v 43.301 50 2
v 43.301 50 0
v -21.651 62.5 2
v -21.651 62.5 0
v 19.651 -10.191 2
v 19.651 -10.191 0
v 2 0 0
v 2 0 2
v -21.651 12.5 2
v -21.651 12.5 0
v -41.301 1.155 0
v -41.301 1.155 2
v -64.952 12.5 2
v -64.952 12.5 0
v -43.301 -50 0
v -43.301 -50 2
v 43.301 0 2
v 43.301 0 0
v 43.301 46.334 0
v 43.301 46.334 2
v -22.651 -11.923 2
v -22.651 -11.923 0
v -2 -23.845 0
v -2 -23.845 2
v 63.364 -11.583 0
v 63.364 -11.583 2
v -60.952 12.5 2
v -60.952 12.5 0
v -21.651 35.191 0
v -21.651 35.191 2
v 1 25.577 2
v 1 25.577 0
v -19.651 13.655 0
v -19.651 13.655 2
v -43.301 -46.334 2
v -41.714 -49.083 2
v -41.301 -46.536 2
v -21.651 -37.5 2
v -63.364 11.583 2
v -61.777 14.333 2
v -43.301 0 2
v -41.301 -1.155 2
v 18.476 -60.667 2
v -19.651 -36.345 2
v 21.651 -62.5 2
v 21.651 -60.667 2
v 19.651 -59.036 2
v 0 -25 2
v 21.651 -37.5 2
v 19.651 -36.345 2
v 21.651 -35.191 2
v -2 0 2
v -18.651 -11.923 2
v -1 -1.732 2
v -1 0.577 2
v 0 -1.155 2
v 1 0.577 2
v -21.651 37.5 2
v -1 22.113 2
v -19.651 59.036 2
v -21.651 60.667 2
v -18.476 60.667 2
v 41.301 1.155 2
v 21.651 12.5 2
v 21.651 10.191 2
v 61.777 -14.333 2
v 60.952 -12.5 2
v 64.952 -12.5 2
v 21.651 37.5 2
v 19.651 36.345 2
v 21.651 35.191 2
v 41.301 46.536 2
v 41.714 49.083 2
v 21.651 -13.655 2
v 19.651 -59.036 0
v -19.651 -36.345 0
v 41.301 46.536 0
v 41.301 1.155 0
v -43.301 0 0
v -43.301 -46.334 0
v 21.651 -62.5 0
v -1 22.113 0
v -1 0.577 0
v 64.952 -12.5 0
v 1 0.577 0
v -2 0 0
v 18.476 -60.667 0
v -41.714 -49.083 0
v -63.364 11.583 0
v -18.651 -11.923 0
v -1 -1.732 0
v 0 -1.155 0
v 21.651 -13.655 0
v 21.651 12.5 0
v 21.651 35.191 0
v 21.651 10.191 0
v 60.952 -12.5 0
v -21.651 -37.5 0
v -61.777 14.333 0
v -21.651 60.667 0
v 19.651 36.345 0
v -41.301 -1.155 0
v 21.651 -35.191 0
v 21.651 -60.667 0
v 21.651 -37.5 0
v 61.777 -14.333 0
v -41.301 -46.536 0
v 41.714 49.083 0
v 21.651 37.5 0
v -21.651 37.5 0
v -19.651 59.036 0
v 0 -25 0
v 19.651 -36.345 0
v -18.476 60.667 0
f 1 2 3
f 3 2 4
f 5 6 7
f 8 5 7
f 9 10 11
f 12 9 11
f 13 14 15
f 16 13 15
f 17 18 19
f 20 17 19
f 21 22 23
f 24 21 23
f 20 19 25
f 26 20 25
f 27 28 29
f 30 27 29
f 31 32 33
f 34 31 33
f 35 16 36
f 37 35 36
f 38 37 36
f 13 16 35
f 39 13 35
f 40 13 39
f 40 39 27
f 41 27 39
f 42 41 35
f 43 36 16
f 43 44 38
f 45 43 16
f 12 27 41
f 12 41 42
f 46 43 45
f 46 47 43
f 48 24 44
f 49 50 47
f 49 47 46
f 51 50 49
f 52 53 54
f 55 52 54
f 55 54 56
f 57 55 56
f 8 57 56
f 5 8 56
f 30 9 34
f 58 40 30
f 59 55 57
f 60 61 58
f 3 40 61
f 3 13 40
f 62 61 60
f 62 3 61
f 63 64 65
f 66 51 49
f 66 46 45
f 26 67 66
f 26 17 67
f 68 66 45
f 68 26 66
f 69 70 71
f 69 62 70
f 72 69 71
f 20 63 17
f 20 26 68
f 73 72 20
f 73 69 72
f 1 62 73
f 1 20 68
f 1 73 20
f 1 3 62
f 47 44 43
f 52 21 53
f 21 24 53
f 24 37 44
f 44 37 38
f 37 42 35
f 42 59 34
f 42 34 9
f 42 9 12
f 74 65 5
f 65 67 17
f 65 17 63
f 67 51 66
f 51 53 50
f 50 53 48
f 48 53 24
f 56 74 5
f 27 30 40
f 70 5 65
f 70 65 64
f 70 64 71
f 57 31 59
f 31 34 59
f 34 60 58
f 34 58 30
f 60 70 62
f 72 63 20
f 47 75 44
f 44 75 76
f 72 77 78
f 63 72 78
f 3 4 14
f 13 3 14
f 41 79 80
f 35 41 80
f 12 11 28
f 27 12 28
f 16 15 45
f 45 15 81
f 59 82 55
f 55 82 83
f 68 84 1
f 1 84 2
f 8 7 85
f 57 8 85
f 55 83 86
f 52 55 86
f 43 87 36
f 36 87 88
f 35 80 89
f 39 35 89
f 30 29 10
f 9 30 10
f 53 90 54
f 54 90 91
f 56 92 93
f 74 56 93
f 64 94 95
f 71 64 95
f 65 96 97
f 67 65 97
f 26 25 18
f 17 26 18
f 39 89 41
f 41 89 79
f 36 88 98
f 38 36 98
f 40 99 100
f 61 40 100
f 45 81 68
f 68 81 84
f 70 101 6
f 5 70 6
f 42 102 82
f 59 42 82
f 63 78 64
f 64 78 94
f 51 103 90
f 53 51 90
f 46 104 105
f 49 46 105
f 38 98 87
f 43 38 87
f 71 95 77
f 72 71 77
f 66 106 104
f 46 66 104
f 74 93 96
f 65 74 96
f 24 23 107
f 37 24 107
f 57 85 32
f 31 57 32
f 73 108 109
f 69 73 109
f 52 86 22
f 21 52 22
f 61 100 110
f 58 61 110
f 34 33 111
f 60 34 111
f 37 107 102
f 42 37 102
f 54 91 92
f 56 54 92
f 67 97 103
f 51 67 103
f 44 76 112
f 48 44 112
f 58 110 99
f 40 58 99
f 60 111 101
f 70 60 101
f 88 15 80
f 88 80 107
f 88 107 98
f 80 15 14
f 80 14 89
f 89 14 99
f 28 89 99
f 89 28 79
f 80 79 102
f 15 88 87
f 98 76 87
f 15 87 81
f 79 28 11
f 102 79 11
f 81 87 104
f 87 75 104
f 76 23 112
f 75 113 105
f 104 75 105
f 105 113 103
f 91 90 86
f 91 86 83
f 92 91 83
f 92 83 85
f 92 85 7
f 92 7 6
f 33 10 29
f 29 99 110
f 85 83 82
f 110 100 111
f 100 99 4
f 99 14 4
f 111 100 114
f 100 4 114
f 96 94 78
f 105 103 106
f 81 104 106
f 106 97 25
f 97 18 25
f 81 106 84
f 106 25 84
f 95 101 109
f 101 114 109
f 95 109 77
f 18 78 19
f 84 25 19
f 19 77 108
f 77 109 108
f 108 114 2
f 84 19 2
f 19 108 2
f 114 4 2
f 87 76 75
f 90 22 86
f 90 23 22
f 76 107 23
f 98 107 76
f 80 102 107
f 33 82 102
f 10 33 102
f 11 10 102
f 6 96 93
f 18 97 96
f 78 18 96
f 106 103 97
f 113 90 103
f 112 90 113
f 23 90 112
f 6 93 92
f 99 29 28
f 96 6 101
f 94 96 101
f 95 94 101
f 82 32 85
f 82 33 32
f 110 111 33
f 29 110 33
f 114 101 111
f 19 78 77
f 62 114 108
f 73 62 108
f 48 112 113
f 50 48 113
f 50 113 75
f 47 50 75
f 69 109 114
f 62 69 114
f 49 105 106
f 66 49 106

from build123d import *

# Parameters (mm, degrees)
F1_DEPTH = 2


# Not quite as in the source:
# - a feature names something its author has since deleted; it is built from what else it names


with BuildPart() as f1:
    # F0 (on Top) → F1 (new body)
    with BuildSketch(Plane.XY):
        Polygon((63.5912331811, -12.2381385313), (63.3644544975, -11.5834848612), (43.3012701892, 0), (43.3012701892, 46.333939444), (42.3941554539, 48.9525541272), (41.7138194028, 49.0834848613), (21.6506350946, 37.5000000002), (-18.4757335211, 60.6669697221), (-21.1970777272, 61.1906926587), (-21.6506350946, 60.6669697224), (-21.6506350946, 37.5), (-61.7770037106, 14.333030278), (-63.591233181, 12.2381385317), (-63.3644544972, 11.583484861), (-43.3012701894, 1e-10), (-43.3012701894, -46.3339394428), (-42.3941554538, -48.9525541268), (-41.7138194016, -49.0834848611), (-21.6506350939, -37.5000000002), (18.4757335209, -60.6669697216), (21.1970777272, -61.1906926583), (21.6506350946, -60.666969722), (21.6506350946, -37.5), (61.7770037099, -14.3330302784), align=None)
        Polygon((19.6506350946, -36.3452994616), (19.6506350946, -59.0358983857), (-19.6506350948, -36.3452994623), (5e-10, -25.0000000003), align=None, mode=Mode.SUBTRACT)
        Polygon((-1.0000000004, 0.5773502687), (-1.9999999999, -2e-10), (-22.6506350946, -11.9226497308), (-1.9999999997, -23.8452994618), (-41.3012701889, -46.535898385), (-41.3012701889, -1.1547005386), (-1.0000000004, 22.1132486534), (-1.0000000004, 1.7320508071), align=None, mode=Mode.SUBTRACT)
        Polygon((21.6506350946, 10.1905989232), (60.9519052838, -12.5), (21.6506350946, -35.1905989232), (-18.6506350946, -11.9226497308), (-1, -1.7320508076), (0, -1.1547005384), (21.6506350946, -13.6547005384), align=None, mode=Mode.SUBTRACT)
        Polygon((-60.9519052838, 12.5), (-21.6506350946, 35.1905989232), (-21.6506350946, 12.5000000002), (-41.3012701894, 1.1547005385), align=None, mode=Mode.SUBTRACT)
        Polygon((19.6506350946, -10.1905989242), (2, -1e-09), (1.0000000005, 0.5773502699), (1.0000000005, 1.7320508081), (1.0000000005, 25.5773502697), (-19.6506350952, 13.6547005382), (-19.6506350952, 59.0358983854), (19.6506350946, 36.3452994618), align=None, mode=Mode.SUBTRACT)
        Polygon((21.6506350946, 35.1905989229), (41.3012701896, 46.5358983847), (41.3012701896, 1.1547005382), (21.6506350946, 12.5), align=None, mode=Mode.SUBTRACT)
        Polygon((-21.6506350946, 60.6669697224), (-21.6506350946, 62.5000000002), (-64.9519052838, 12.5), (-61.7770037106, 14.333030278), align=None)
        Polygon((41.7138194028, 49.0834848613), (43.3012701892, 50.0000000002), (-21.6506350948, 62.5000000001), (-18.4757335211, 60.6669697221), align=None)
        Polygon((-64.9519052838, 12.5), (-43.301270189, -50), (-43.3012701894, -46.3339394428), (-63.3644544972, 11.583484861), align=None)
        Polygon((-61.7770037106, 14.333030278), (-64.9519052838, 12.5), (-63.3644544972, 11.583484861), (-63.591233181, 12.2381385317), align=None)
        Polygon((-43.3012701894, -46.3339394428), (-43.3012701894, -50.0000000007), (-41.7138194016, -49.0834848611), (-42.3941554538, -48.9525541268), align=None)
        Polygon((-43.301270189, -50), (21.6506350949, -62.4999999997), (18.4757335209, -60.6669697216), (-41.7138194016, -49.0834848611), align=None)
        Polygon((18.4757335209, -60.6669697216), (21.6506350946, -62.4999999998), (21.6506350946, -60.666969722), (21.1970777272, -61.1906926583), align=None)
        Polygon((21.6506350949, -62.4999999997), (64.9519052839, -12.4999999995), (61.7770037099, -14.3330302784), (21.6506350946, -60.666969722), align=None)
        Polygon((61.7770037099, -14.3330302784), (64.9519052838, -12.5), (63.3644544975, -11.5834848612), (63.5912331811, -12.2381385313), align=None)
        Polygon((63.3644544975, -11.5834848612), (64.9519052838, -12.5), (43.3012701891, 50.0000000004), (43.3012701892, 46.333939444), align=None)
        Polygon((43.3012701892, 46.333939444), (43.3012701892, 50.0000000002), (41.7138194028, 49.0834848613), (42.3941554539, 48.9525541272), align=None)
        Polygon((-18.4757335211, 60.6669697221), (-21.6506350946, 62.5000000002), (-21.6506350946, 60.6669697224), (-21.1970777272, 61.1906926587), align=None)
    extrude(amount=F1_DEPTH)


solid = f1.part
